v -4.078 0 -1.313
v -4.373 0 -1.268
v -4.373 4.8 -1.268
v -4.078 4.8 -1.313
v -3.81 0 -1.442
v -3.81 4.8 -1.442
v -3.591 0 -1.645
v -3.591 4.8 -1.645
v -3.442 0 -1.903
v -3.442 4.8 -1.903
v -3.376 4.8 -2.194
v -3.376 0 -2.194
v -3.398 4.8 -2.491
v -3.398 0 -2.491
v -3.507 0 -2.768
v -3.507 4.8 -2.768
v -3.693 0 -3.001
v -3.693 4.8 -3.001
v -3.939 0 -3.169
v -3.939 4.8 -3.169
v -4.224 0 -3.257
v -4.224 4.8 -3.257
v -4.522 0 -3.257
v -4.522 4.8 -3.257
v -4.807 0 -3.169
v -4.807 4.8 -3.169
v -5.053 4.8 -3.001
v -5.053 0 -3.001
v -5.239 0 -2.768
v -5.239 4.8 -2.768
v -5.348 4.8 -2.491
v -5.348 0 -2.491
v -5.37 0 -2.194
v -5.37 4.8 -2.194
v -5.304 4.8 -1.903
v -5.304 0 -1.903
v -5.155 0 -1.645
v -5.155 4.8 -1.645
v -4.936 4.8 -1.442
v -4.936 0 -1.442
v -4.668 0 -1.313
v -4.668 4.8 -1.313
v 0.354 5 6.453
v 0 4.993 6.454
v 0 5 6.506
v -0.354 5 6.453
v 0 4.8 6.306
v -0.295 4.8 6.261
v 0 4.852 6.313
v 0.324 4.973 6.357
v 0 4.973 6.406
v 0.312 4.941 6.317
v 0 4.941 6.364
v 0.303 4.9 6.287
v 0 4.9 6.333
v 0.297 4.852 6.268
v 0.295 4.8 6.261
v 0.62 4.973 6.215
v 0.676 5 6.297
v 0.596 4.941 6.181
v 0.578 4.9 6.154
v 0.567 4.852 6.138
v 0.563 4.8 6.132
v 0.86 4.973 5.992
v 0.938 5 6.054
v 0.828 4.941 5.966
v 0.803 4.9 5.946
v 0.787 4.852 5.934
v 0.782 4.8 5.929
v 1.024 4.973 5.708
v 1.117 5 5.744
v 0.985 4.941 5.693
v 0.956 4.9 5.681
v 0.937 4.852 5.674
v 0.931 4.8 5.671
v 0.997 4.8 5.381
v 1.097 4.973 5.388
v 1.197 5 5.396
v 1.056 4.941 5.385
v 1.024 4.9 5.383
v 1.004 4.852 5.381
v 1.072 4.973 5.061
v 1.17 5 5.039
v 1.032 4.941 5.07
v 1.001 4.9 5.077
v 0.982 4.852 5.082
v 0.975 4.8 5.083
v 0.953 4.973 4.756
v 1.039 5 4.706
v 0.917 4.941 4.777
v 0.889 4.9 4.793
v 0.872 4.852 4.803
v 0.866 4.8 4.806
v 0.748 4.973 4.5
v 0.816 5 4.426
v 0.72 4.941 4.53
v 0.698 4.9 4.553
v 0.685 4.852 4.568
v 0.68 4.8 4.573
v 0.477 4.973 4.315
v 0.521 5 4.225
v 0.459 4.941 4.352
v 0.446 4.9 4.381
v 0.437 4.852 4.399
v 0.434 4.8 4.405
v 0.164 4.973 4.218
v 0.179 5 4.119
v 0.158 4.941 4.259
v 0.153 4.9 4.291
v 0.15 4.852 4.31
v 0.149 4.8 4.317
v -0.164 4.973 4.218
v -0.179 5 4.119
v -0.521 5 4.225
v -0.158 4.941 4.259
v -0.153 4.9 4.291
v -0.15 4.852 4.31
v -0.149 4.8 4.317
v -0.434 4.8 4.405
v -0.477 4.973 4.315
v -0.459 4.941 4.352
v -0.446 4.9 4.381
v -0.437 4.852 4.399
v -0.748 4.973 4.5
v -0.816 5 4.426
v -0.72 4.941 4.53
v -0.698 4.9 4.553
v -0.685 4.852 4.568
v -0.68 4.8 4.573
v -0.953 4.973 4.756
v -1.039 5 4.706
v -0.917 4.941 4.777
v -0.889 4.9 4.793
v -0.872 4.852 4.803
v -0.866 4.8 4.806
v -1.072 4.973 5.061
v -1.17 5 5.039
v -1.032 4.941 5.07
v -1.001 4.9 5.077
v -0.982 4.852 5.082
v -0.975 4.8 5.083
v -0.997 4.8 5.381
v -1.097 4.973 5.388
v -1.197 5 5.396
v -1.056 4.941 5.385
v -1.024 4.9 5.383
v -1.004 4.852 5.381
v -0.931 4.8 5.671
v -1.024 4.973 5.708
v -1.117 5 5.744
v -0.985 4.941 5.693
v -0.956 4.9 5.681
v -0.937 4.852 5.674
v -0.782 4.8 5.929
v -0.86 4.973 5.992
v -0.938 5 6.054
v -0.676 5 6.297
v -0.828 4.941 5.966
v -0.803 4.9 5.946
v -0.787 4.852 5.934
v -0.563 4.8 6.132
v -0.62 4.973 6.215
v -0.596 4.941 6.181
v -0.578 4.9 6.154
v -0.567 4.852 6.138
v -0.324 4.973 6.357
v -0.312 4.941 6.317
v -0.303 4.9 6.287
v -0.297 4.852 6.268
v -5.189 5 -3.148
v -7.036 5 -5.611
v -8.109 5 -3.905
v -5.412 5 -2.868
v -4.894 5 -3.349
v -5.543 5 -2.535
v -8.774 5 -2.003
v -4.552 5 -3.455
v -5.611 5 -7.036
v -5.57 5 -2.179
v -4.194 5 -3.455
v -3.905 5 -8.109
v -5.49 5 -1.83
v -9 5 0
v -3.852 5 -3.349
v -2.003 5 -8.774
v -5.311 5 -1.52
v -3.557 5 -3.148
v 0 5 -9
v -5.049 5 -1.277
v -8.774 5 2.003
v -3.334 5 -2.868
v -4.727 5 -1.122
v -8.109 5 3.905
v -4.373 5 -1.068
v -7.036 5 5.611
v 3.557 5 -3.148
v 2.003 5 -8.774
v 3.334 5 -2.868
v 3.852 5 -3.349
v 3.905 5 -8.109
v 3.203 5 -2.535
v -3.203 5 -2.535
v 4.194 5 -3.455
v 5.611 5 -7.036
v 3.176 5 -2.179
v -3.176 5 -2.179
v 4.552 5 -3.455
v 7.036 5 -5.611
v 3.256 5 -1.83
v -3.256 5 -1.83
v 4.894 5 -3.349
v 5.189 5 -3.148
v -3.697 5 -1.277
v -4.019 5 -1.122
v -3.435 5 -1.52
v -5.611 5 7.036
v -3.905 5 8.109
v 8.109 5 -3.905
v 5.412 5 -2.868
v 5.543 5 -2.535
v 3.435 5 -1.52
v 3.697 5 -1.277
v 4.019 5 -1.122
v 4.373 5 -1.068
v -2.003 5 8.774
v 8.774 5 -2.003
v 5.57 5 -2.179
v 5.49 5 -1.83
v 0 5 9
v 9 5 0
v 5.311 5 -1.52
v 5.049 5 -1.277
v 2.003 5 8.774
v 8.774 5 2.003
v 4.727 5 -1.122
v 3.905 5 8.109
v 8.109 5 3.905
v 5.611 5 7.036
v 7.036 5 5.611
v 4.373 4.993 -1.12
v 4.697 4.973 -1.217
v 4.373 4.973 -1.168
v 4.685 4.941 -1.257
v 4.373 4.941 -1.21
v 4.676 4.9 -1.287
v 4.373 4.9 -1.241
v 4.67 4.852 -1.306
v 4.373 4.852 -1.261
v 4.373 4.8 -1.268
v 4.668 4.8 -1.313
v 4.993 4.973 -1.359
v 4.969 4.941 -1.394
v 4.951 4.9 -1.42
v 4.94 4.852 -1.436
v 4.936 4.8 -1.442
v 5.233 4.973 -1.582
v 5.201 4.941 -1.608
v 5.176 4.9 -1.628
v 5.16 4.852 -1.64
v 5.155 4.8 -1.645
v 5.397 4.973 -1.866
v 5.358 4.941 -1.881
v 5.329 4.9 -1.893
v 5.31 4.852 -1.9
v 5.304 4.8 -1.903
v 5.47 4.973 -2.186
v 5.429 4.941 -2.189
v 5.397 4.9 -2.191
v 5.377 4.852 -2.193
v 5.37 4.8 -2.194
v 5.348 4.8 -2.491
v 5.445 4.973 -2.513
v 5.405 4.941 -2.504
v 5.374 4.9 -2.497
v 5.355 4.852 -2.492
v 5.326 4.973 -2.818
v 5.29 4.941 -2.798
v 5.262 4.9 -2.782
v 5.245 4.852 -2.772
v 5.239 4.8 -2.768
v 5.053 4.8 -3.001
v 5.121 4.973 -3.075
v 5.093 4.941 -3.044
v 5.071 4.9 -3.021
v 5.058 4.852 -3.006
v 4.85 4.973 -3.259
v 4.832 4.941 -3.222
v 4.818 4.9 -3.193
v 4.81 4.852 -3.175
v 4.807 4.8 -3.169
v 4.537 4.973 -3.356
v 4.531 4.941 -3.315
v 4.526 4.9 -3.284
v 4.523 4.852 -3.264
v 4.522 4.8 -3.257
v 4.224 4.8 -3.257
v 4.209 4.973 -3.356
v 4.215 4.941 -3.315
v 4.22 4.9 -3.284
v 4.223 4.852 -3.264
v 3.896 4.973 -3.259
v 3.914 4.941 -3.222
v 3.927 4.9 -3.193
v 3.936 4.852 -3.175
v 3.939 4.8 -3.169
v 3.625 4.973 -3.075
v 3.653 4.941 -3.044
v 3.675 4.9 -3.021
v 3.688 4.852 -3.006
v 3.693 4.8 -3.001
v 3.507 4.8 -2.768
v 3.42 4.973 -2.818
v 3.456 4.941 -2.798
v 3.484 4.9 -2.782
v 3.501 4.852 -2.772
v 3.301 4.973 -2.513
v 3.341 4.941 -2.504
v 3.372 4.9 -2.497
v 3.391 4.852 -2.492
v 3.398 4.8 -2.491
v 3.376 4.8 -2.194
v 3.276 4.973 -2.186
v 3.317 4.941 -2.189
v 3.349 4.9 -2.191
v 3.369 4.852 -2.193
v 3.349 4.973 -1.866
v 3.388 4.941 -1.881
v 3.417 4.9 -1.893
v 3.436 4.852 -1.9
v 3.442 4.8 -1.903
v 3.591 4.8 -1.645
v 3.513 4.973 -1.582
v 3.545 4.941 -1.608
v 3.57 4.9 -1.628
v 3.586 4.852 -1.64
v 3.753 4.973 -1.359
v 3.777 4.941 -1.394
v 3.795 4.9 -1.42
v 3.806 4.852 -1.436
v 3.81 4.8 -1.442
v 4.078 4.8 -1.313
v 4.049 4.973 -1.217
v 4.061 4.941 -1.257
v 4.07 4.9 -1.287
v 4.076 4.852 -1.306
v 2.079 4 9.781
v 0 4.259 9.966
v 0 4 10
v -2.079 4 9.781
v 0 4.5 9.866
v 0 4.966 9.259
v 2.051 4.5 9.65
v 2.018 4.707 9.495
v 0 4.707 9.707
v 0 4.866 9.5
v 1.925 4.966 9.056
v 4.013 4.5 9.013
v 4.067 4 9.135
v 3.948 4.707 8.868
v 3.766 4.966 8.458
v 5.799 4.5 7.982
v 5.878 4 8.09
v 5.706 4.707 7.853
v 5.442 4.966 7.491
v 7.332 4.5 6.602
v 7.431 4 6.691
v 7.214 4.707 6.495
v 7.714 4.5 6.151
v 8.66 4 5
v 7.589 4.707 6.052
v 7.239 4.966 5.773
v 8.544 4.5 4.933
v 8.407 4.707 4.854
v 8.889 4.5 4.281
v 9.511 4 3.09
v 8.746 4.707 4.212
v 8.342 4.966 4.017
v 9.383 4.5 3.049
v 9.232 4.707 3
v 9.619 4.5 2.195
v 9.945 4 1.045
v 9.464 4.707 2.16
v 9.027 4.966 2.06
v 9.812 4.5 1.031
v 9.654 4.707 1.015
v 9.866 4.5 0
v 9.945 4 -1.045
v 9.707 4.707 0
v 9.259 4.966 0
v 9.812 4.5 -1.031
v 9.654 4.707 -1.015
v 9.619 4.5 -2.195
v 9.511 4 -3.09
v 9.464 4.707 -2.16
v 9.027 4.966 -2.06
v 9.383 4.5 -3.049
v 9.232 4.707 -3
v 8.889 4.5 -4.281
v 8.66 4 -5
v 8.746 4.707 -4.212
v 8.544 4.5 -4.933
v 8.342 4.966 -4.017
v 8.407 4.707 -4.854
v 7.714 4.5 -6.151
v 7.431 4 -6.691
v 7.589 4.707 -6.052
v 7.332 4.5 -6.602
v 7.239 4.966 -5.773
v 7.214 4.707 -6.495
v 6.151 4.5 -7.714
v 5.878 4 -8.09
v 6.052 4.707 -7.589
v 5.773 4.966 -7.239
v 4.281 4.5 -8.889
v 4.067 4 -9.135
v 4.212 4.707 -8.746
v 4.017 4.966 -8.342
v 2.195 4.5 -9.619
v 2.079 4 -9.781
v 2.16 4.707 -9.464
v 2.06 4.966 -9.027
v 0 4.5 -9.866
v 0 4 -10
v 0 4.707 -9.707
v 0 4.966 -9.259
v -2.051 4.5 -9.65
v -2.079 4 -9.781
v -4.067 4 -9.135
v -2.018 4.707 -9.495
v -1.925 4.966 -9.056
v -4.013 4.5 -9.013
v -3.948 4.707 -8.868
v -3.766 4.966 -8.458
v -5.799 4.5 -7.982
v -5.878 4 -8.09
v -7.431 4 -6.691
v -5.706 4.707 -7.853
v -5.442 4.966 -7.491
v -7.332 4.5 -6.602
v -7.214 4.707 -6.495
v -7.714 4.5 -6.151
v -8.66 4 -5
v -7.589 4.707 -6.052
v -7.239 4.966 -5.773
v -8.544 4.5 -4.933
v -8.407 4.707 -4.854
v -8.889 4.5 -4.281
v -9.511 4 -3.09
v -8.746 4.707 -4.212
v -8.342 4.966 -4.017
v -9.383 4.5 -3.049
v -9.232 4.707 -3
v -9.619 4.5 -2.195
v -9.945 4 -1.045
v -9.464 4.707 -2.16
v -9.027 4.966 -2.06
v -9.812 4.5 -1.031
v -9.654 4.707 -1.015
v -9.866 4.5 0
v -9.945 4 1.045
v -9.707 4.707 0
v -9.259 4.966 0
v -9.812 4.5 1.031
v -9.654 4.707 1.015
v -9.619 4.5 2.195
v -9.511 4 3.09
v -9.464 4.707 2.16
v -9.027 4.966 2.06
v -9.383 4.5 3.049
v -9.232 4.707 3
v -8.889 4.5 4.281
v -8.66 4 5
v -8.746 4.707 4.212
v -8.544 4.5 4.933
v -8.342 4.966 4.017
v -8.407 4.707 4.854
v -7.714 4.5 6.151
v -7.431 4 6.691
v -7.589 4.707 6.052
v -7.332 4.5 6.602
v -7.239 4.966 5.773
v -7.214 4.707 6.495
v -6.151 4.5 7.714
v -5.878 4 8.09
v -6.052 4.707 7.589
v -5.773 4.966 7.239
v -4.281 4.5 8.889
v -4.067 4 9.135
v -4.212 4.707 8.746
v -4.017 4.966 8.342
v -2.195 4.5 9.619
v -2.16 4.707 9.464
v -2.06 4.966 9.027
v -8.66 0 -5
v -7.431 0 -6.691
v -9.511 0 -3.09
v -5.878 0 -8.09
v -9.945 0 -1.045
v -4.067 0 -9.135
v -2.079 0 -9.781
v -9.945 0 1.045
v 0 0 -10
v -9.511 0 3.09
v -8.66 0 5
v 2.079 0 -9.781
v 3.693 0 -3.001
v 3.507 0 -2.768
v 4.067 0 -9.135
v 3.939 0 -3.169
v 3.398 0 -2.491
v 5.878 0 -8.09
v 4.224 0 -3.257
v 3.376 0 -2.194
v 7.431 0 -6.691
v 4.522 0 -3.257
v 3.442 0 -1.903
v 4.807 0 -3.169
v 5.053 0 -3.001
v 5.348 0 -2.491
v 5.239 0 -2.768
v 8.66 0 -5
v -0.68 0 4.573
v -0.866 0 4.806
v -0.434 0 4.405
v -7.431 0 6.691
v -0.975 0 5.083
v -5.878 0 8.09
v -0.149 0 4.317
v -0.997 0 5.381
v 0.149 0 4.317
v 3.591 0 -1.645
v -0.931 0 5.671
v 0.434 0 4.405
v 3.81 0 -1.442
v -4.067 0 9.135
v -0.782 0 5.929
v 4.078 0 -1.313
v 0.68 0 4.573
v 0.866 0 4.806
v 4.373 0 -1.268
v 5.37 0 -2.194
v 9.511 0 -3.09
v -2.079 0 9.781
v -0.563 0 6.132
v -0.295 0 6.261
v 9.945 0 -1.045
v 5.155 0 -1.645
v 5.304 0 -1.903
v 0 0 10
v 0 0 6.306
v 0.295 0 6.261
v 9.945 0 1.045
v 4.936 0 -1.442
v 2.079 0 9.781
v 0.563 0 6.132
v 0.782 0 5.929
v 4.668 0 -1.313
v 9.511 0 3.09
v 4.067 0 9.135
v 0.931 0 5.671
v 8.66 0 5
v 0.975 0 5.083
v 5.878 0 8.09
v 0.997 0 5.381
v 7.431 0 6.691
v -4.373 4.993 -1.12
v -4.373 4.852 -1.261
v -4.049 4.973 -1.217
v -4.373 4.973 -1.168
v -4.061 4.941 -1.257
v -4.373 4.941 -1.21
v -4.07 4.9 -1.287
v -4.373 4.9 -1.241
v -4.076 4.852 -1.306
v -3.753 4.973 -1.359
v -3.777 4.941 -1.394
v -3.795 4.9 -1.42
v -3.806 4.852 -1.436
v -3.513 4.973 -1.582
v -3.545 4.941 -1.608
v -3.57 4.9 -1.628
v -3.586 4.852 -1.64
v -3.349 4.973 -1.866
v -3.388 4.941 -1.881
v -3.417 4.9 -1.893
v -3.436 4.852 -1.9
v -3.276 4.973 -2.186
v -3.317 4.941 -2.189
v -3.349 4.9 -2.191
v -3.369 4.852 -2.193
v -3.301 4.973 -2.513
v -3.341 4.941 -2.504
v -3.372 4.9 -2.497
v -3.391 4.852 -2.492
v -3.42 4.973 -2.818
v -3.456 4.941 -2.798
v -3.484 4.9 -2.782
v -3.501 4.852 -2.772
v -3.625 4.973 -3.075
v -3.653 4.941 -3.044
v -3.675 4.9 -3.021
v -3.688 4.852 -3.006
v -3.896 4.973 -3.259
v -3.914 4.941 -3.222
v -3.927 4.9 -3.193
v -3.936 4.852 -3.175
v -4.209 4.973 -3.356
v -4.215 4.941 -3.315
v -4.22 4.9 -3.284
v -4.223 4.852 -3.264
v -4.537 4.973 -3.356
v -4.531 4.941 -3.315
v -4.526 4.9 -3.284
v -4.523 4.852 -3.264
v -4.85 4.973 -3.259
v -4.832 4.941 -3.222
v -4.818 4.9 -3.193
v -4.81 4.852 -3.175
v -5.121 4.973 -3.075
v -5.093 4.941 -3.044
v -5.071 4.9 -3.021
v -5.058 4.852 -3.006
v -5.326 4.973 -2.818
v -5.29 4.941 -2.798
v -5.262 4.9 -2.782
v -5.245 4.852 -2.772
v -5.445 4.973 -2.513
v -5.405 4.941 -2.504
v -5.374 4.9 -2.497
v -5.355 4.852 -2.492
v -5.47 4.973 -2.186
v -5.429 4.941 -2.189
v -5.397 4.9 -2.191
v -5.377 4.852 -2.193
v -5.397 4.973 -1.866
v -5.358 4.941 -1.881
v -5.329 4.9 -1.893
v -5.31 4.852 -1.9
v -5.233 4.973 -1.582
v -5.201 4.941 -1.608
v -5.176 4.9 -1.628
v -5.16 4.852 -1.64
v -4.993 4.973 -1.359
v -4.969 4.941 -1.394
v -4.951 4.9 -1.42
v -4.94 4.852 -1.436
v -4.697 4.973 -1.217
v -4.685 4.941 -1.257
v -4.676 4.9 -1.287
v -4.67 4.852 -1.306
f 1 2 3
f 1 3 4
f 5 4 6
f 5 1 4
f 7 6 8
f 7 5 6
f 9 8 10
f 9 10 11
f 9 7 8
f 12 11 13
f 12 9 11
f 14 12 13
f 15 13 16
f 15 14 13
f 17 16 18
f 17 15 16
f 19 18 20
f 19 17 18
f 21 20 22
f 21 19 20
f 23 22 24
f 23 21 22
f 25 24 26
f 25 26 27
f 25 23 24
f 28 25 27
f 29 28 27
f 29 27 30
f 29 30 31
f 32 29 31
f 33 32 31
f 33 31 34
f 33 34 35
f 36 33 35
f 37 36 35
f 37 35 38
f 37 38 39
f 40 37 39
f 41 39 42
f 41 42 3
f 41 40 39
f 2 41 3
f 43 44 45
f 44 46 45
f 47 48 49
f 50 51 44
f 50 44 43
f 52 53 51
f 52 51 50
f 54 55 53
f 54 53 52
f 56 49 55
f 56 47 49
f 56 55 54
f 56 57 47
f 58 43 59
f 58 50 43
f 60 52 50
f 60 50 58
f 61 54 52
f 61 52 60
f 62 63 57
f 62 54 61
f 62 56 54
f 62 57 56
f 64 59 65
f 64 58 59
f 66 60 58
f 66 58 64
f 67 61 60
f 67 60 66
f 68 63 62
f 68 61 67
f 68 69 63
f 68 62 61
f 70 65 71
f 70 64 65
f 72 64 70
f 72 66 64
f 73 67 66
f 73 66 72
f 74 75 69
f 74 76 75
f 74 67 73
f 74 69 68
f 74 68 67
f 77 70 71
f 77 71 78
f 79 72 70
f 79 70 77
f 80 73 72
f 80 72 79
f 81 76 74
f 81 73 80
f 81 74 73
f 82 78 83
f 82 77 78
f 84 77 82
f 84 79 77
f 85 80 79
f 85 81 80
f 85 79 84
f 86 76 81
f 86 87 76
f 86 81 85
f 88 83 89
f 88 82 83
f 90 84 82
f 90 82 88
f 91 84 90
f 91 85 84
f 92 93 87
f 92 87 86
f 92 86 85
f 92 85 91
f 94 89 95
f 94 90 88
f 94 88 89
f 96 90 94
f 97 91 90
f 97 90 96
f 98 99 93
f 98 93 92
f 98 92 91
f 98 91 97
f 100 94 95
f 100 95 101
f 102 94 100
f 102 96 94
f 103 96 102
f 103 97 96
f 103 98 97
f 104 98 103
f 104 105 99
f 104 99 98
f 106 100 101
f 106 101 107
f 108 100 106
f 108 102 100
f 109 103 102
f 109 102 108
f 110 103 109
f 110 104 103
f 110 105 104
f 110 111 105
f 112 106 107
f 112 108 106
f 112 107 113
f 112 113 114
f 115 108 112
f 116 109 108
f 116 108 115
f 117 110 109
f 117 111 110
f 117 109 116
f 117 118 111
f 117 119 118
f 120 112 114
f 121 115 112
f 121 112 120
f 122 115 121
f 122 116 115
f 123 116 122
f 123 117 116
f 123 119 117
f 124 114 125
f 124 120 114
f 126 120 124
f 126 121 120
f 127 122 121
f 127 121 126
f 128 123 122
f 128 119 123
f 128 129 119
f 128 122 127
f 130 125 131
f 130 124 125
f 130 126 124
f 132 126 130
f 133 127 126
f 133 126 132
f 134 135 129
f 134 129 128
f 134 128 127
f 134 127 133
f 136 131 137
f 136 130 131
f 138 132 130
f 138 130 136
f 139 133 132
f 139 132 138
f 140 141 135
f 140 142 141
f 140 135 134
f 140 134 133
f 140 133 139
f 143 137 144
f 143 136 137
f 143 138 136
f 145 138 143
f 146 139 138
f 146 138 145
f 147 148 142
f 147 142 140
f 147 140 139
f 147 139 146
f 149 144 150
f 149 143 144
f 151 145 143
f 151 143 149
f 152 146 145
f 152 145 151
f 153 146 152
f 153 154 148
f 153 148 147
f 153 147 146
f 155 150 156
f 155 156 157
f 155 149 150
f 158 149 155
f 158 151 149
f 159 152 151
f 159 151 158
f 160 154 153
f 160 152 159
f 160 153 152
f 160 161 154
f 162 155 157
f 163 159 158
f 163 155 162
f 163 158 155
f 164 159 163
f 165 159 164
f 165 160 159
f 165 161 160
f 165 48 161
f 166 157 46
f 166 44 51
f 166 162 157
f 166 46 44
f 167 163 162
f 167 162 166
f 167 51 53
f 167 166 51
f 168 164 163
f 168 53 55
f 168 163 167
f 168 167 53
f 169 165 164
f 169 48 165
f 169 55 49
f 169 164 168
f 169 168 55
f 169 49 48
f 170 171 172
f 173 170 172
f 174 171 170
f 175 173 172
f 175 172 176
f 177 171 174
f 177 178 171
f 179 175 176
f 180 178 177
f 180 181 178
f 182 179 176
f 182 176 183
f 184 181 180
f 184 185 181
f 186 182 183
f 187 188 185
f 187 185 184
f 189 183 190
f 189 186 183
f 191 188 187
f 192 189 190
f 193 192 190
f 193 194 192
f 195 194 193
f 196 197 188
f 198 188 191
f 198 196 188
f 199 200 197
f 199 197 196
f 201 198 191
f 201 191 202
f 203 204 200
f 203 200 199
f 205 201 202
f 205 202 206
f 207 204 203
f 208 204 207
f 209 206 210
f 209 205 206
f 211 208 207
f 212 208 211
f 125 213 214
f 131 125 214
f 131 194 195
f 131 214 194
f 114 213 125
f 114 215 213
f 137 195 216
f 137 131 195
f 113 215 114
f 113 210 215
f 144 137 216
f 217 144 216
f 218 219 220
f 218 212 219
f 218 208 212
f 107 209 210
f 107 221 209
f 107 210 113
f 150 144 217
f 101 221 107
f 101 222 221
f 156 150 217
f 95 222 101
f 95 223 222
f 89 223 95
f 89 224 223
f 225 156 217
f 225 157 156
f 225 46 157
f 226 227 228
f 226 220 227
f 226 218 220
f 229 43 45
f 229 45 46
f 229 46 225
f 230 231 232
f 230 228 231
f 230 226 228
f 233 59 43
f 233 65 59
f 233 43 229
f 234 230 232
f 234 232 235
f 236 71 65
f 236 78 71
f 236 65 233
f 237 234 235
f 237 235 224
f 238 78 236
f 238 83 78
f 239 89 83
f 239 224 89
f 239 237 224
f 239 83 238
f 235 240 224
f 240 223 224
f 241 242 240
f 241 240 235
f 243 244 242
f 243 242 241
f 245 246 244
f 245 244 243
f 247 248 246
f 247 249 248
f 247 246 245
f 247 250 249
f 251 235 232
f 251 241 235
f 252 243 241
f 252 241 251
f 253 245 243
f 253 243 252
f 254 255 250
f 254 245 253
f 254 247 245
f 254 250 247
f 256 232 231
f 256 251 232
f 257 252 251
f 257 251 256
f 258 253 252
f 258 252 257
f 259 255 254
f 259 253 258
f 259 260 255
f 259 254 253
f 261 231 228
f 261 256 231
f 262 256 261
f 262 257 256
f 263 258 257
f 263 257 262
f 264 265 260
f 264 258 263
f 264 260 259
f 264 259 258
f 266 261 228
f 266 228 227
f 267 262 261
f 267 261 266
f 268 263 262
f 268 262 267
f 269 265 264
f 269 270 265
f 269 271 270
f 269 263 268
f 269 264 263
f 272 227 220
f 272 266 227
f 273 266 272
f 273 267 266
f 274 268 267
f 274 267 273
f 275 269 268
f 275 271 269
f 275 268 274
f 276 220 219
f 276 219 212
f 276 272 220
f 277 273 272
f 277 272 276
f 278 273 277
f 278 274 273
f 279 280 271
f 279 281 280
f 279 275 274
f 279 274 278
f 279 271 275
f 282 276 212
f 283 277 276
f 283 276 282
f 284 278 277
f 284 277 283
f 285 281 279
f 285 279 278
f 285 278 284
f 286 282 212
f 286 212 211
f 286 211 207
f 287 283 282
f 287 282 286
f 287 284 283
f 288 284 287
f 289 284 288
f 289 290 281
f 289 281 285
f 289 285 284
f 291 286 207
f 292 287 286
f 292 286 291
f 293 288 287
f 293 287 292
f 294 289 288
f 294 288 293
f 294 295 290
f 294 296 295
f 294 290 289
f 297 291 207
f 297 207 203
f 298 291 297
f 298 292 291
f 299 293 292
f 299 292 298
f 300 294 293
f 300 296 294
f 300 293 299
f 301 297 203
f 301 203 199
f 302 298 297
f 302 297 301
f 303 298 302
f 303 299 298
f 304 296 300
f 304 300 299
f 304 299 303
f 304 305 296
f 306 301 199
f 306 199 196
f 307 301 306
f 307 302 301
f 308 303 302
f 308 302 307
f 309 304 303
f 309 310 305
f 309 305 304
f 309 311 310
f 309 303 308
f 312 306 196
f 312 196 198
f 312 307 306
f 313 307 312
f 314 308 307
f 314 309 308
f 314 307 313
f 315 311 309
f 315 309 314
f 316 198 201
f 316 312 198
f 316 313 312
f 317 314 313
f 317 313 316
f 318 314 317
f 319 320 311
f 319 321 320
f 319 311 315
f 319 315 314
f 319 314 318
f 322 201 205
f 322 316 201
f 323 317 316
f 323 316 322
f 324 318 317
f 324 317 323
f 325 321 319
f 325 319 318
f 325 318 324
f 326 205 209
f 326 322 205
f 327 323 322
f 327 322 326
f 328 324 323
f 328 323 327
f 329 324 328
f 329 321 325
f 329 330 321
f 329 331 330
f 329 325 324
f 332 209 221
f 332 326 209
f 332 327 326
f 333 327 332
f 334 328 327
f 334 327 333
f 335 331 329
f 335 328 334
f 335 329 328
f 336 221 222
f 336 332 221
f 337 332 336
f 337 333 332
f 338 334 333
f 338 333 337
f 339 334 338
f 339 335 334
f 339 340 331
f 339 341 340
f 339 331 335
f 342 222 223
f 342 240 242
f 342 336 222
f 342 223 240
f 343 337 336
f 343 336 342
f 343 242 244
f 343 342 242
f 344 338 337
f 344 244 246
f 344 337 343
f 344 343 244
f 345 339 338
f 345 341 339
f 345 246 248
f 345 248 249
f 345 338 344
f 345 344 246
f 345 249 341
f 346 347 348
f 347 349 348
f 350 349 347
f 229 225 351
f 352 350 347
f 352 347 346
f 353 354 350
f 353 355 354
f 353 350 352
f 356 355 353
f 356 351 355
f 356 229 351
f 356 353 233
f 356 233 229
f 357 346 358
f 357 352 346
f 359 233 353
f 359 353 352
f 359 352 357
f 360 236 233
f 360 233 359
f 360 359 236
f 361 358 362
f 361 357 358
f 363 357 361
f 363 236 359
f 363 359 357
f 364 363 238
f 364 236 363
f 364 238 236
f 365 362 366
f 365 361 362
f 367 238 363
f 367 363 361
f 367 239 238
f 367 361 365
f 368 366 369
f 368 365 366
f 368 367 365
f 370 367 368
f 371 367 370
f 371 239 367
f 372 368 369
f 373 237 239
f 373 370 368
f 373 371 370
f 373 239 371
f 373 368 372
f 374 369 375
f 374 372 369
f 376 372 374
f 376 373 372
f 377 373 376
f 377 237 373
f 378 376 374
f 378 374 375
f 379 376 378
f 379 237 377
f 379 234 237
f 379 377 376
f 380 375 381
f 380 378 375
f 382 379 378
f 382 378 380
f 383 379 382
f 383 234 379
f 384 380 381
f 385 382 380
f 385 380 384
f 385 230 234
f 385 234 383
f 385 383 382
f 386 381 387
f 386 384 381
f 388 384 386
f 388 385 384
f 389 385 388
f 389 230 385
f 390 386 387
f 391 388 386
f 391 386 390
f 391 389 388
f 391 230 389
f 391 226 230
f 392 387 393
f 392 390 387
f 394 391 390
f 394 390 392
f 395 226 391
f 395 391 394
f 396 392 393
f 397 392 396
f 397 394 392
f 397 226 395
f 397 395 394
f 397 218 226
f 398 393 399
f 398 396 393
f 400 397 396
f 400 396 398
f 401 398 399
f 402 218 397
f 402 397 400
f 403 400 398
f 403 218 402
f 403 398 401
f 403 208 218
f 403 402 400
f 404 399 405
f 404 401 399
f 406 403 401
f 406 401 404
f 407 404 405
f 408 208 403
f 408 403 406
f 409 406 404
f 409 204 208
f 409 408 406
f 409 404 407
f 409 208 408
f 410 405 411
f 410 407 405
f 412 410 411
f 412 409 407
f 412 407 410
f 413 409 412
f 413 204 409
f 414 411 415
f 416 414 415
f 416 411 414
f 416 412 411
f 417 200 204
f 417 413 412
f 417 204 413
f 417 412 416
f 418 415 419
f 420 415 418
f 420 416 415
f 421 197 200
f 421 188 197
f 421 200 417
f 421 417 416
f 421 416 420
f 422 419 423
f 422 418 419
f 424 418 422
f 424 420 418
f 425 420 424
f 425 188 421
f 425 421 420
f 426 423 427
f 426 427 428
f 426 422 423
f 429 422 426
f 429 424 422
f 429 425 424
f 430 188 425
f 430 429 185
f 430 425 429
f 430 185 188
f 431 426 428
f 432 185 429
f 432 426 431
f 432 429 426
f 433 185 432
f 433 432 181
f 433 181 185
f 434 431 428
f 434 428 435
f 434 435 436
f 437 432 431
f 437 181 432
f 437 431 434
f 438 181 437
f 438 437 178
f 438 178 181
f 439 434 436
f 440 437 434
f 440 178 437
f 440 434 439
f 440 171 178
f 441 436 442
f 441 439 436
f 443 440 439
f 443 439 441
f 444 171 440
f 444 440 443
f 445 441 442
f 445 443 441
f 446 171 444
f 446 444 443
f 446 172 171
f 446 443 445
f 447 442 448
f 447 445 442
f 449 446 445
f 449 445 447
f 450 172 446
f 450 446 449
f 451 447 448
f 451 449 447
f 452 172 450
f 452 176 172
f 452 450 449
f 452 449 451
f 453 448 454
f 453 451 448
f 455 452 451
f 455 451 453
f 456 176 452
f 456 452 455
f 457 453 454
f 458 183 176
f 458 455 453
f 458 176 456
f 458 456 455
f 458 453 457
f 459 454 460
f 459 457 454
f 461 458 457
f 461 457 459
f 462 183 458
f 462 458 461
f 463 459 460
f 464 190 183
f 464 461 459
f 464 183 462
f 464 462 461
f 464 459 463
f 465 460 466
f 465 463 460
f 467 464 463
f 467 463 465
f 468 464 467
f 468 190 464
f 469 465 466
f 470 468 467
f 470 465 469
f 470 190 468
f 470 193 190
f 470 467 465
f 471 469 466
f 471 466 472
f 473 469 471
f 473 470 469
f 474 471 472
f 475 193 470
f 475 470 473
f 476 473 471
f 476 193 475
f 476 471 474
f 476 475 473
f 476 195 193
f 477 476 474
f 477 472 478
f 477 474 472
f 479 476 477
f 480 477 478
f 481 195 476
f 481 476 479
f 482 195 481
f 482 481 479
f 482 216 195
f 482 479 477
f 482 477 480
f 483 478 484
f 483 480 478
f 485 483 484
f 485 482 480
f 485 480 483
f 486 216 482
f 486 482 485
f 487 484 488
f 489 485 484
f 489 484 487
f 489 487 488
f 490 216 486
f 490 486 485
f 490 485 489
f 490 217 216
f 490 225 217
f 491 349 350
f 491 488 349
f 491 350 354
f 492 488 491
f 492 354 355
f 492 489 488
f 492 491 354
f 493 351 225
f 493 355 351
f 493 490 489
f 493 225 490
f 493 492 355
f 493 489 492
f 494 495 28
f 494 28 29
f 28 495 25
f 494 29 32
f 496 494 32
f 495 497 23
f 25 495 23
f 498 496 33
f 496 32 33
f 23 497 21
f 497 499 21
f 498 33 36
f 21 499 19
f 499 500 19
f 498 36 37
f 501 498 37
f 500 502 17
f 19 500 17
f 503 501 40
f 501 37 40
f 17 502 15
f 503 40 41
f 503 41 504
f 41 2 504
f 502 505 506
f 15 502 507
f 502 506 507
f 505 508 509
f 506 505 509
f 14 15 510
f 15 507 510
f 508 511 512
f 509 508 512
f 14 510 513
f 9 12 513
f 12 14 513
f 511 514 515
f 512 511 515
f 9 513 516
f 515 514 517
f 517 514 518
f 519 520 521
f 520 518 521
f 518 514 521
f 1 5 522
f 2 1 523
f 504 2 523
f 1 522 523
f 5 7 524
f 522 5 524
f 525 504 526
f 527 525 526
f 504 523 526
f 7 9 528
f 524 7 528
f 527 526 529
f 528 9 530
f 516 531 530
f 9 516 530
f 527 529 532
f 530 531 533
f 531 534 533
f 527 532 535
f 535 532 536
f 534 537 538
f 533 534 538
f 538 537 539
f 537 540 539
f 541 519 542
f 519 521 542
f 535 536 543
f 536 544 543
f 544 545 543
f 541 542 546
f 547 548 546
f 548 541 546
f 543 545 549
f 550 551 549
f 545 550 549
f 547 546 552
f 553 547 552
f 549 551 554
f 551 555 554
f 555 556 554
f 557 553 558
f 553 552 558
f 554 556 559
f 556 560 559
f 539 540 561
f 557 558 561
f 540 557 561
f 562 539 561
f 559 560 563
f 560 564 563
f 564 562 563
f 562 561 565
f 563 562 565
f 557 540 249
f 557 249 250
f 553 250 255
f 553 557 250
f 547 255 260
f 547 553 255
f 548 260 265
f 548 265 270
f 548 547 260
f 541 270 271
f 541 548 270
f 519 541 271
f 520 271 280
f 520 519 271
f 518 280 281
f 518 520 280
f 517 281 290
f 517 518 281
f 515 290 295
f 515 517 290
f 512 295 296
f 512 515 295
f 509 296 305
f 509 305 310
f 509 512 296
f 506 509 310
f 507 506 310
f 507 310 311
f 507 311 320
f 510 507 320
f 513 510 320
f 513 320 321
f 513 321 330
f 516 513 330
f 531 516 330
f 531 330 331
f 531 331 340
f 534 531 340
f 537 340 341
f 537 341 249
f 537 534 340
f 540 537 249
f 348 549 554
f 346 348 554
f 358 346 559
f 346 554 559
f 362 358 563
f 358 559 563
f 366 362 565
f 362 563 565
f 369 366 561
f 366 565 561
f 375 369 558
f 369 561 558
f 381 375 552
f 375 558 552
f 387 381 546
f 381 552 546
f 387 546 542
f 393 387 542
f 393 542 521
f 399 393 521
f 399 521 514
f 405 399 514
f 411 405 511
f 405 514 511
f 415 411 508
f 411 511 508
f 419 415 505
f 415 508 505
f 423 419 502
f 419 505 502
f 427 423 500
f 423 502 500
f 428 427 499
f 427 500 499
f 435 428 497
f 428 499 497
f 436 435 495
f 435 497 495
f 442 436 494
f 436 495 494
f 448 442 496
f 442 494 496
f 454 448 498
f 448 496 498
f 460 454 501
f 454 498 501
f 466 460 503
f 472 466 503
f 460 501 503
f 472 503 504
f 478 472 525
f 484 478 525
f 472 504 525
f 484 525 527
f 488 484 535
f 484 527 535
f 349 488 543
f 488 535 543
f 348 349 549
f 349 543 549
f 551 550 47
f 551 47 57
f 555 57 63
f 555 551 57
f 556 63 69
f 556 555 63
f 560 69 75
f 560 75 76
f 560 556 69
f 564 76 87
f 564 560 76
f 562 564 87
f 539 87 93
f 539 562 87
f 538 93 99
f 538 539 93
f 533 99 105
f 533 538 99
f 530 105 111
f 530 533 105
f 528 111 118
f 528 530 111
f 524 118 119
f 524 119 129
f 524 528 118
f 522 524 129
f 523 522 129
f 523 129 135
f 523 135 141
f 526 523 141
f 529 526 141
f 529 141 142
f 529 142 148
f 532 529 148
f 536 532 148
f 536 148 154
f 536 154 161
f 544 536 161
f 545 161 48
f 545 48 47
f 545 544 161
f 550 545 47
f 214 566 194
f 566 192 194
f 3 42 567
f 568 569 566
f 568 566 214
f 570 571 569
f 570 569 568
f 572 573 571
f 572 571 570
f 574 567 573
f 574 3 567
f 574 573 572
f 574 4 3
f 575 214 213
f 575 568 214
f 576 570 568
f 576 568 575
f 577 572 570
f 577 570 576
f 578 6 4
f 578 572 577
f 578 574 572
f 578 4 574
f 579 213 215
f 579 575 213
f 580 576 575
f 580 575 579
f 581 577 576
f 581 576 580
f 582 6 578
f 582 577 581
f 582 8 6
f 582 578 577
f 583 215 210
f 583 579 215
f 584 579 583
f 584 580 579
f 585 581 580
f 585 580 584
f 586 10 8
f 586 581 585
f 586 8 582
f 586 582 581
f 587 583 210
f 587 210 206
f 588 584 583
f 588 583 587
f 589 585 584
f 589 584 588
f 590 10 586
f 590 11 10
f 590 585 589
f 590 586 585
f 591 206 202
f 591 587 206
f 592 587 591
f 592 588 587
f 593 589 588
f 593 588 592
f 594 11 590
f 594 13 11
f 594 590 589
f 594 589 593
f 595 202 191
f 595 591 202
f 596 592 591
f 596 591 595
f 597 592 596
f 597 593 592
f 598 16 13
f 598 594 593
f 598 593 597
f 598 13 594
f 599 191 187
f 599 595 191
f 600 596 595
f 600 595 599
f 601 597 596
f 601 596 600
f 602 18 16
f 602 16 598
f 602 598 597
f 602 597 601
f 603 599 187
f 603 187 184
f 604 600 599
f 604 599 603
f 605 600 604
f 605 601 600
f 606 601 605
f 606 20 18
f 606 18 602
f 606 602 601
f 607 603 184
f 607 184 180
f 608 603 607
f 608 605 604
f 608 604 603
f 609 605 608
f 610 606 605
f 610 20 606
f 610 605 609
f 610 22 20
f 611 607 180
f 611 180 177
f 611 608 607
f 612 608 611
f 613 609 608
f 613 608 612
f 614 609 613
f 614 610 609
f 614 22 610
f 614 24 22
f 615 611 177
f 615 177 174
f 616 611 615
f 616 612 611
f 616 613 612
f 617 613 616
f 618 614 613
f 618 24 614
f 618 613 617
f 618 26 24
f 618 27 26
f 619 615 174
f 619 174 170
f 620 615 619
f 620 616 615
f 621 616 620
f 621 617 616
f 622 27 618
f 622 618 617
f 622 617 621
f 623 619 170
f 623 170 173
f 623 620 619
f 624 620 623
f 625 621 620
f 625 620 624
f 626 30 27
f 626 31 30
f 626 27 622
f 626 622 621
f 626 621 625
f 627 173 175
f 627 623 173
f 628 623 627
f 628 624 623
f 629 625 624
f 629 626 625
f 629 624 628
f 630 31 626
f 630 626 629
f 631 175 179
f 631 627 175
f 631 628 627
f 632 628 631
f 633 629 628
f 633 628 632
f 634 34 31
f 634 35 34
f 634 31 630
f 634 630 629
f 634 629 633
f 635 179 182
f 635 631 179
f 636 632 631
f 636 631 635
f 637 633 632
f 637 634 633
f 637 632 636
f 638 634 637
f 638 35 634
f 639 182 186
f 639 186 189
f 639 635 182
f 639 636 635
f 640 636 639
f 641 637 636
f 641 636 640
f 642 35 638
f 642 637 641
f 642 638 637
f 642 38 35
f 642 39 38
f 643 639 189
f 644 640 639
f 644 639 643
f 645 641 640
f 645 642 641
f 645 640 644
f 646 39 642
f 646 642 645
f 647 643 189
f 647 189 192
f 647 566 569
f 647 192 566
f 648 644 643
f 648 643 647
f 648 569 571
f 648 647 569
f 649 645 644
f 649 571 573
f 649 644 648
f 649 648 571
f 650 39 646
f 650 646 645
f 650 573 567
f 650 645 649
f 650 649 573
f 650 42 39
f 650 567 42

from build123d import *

# Parameters (mm, degrees)
SKETCH1_R           = 10
SKETCH1_R_2         = 1
BOSS_EXTRUDE1_DEPTH = 5
FILLET1_R           = 1
FILLET2_R           = 0.2


with BuildPart() as part:
    # Sketch1 → Boss-Extrude1 (new body)
    with BuildSketch(Plane(origin=(0, 0, 0), x_dir=(1, 0, 0), z_dir=(0, 1, 0))):
        with Locations(Location((0, 0, 0), (0, 0, 270))):
            Circle(SKETCH1_R)
        with Locations(Location((-4.372934276, 2.268231964, 0), (0, 0, 270))):
            Circle(SKETCH1_R_2, mode=Mode.SUBTRACT)
        with Locations(Location((4.372934276, 2.268231964, 0), (0, 0, 270))):
            Circle(SKETCH1_R_2, mode=Mode.SUBTRACT)
        with Locations(Location((0, -5.30591238, 0), (0, 0, 270))):
            Circle(SKETCH1_R_2, mode=Mode.SUBTRACT)
    extrude(amount=BOSS_EXTRUDE1_DEPTH)

    # Fillet1
    fillet1_edges = [part.edges().sort_by_distance(p)[0] for p in [
        (0, 5, -10),
    ]]
    fillet(fillet1_edges, radius=FILLET1_R)

    # Fillet2
    fillet2_edges = [part.edges().sort_by_distance(p)[0] for p in [
        (0, 5, 4.30591238),
        (4.372934276, 5, -3.268231964),
        (-4.372934276, 5, -3.268231964),
    ]]
    fillet(fillet2_edges, radius=FILLET2_R)


solid = part.part
